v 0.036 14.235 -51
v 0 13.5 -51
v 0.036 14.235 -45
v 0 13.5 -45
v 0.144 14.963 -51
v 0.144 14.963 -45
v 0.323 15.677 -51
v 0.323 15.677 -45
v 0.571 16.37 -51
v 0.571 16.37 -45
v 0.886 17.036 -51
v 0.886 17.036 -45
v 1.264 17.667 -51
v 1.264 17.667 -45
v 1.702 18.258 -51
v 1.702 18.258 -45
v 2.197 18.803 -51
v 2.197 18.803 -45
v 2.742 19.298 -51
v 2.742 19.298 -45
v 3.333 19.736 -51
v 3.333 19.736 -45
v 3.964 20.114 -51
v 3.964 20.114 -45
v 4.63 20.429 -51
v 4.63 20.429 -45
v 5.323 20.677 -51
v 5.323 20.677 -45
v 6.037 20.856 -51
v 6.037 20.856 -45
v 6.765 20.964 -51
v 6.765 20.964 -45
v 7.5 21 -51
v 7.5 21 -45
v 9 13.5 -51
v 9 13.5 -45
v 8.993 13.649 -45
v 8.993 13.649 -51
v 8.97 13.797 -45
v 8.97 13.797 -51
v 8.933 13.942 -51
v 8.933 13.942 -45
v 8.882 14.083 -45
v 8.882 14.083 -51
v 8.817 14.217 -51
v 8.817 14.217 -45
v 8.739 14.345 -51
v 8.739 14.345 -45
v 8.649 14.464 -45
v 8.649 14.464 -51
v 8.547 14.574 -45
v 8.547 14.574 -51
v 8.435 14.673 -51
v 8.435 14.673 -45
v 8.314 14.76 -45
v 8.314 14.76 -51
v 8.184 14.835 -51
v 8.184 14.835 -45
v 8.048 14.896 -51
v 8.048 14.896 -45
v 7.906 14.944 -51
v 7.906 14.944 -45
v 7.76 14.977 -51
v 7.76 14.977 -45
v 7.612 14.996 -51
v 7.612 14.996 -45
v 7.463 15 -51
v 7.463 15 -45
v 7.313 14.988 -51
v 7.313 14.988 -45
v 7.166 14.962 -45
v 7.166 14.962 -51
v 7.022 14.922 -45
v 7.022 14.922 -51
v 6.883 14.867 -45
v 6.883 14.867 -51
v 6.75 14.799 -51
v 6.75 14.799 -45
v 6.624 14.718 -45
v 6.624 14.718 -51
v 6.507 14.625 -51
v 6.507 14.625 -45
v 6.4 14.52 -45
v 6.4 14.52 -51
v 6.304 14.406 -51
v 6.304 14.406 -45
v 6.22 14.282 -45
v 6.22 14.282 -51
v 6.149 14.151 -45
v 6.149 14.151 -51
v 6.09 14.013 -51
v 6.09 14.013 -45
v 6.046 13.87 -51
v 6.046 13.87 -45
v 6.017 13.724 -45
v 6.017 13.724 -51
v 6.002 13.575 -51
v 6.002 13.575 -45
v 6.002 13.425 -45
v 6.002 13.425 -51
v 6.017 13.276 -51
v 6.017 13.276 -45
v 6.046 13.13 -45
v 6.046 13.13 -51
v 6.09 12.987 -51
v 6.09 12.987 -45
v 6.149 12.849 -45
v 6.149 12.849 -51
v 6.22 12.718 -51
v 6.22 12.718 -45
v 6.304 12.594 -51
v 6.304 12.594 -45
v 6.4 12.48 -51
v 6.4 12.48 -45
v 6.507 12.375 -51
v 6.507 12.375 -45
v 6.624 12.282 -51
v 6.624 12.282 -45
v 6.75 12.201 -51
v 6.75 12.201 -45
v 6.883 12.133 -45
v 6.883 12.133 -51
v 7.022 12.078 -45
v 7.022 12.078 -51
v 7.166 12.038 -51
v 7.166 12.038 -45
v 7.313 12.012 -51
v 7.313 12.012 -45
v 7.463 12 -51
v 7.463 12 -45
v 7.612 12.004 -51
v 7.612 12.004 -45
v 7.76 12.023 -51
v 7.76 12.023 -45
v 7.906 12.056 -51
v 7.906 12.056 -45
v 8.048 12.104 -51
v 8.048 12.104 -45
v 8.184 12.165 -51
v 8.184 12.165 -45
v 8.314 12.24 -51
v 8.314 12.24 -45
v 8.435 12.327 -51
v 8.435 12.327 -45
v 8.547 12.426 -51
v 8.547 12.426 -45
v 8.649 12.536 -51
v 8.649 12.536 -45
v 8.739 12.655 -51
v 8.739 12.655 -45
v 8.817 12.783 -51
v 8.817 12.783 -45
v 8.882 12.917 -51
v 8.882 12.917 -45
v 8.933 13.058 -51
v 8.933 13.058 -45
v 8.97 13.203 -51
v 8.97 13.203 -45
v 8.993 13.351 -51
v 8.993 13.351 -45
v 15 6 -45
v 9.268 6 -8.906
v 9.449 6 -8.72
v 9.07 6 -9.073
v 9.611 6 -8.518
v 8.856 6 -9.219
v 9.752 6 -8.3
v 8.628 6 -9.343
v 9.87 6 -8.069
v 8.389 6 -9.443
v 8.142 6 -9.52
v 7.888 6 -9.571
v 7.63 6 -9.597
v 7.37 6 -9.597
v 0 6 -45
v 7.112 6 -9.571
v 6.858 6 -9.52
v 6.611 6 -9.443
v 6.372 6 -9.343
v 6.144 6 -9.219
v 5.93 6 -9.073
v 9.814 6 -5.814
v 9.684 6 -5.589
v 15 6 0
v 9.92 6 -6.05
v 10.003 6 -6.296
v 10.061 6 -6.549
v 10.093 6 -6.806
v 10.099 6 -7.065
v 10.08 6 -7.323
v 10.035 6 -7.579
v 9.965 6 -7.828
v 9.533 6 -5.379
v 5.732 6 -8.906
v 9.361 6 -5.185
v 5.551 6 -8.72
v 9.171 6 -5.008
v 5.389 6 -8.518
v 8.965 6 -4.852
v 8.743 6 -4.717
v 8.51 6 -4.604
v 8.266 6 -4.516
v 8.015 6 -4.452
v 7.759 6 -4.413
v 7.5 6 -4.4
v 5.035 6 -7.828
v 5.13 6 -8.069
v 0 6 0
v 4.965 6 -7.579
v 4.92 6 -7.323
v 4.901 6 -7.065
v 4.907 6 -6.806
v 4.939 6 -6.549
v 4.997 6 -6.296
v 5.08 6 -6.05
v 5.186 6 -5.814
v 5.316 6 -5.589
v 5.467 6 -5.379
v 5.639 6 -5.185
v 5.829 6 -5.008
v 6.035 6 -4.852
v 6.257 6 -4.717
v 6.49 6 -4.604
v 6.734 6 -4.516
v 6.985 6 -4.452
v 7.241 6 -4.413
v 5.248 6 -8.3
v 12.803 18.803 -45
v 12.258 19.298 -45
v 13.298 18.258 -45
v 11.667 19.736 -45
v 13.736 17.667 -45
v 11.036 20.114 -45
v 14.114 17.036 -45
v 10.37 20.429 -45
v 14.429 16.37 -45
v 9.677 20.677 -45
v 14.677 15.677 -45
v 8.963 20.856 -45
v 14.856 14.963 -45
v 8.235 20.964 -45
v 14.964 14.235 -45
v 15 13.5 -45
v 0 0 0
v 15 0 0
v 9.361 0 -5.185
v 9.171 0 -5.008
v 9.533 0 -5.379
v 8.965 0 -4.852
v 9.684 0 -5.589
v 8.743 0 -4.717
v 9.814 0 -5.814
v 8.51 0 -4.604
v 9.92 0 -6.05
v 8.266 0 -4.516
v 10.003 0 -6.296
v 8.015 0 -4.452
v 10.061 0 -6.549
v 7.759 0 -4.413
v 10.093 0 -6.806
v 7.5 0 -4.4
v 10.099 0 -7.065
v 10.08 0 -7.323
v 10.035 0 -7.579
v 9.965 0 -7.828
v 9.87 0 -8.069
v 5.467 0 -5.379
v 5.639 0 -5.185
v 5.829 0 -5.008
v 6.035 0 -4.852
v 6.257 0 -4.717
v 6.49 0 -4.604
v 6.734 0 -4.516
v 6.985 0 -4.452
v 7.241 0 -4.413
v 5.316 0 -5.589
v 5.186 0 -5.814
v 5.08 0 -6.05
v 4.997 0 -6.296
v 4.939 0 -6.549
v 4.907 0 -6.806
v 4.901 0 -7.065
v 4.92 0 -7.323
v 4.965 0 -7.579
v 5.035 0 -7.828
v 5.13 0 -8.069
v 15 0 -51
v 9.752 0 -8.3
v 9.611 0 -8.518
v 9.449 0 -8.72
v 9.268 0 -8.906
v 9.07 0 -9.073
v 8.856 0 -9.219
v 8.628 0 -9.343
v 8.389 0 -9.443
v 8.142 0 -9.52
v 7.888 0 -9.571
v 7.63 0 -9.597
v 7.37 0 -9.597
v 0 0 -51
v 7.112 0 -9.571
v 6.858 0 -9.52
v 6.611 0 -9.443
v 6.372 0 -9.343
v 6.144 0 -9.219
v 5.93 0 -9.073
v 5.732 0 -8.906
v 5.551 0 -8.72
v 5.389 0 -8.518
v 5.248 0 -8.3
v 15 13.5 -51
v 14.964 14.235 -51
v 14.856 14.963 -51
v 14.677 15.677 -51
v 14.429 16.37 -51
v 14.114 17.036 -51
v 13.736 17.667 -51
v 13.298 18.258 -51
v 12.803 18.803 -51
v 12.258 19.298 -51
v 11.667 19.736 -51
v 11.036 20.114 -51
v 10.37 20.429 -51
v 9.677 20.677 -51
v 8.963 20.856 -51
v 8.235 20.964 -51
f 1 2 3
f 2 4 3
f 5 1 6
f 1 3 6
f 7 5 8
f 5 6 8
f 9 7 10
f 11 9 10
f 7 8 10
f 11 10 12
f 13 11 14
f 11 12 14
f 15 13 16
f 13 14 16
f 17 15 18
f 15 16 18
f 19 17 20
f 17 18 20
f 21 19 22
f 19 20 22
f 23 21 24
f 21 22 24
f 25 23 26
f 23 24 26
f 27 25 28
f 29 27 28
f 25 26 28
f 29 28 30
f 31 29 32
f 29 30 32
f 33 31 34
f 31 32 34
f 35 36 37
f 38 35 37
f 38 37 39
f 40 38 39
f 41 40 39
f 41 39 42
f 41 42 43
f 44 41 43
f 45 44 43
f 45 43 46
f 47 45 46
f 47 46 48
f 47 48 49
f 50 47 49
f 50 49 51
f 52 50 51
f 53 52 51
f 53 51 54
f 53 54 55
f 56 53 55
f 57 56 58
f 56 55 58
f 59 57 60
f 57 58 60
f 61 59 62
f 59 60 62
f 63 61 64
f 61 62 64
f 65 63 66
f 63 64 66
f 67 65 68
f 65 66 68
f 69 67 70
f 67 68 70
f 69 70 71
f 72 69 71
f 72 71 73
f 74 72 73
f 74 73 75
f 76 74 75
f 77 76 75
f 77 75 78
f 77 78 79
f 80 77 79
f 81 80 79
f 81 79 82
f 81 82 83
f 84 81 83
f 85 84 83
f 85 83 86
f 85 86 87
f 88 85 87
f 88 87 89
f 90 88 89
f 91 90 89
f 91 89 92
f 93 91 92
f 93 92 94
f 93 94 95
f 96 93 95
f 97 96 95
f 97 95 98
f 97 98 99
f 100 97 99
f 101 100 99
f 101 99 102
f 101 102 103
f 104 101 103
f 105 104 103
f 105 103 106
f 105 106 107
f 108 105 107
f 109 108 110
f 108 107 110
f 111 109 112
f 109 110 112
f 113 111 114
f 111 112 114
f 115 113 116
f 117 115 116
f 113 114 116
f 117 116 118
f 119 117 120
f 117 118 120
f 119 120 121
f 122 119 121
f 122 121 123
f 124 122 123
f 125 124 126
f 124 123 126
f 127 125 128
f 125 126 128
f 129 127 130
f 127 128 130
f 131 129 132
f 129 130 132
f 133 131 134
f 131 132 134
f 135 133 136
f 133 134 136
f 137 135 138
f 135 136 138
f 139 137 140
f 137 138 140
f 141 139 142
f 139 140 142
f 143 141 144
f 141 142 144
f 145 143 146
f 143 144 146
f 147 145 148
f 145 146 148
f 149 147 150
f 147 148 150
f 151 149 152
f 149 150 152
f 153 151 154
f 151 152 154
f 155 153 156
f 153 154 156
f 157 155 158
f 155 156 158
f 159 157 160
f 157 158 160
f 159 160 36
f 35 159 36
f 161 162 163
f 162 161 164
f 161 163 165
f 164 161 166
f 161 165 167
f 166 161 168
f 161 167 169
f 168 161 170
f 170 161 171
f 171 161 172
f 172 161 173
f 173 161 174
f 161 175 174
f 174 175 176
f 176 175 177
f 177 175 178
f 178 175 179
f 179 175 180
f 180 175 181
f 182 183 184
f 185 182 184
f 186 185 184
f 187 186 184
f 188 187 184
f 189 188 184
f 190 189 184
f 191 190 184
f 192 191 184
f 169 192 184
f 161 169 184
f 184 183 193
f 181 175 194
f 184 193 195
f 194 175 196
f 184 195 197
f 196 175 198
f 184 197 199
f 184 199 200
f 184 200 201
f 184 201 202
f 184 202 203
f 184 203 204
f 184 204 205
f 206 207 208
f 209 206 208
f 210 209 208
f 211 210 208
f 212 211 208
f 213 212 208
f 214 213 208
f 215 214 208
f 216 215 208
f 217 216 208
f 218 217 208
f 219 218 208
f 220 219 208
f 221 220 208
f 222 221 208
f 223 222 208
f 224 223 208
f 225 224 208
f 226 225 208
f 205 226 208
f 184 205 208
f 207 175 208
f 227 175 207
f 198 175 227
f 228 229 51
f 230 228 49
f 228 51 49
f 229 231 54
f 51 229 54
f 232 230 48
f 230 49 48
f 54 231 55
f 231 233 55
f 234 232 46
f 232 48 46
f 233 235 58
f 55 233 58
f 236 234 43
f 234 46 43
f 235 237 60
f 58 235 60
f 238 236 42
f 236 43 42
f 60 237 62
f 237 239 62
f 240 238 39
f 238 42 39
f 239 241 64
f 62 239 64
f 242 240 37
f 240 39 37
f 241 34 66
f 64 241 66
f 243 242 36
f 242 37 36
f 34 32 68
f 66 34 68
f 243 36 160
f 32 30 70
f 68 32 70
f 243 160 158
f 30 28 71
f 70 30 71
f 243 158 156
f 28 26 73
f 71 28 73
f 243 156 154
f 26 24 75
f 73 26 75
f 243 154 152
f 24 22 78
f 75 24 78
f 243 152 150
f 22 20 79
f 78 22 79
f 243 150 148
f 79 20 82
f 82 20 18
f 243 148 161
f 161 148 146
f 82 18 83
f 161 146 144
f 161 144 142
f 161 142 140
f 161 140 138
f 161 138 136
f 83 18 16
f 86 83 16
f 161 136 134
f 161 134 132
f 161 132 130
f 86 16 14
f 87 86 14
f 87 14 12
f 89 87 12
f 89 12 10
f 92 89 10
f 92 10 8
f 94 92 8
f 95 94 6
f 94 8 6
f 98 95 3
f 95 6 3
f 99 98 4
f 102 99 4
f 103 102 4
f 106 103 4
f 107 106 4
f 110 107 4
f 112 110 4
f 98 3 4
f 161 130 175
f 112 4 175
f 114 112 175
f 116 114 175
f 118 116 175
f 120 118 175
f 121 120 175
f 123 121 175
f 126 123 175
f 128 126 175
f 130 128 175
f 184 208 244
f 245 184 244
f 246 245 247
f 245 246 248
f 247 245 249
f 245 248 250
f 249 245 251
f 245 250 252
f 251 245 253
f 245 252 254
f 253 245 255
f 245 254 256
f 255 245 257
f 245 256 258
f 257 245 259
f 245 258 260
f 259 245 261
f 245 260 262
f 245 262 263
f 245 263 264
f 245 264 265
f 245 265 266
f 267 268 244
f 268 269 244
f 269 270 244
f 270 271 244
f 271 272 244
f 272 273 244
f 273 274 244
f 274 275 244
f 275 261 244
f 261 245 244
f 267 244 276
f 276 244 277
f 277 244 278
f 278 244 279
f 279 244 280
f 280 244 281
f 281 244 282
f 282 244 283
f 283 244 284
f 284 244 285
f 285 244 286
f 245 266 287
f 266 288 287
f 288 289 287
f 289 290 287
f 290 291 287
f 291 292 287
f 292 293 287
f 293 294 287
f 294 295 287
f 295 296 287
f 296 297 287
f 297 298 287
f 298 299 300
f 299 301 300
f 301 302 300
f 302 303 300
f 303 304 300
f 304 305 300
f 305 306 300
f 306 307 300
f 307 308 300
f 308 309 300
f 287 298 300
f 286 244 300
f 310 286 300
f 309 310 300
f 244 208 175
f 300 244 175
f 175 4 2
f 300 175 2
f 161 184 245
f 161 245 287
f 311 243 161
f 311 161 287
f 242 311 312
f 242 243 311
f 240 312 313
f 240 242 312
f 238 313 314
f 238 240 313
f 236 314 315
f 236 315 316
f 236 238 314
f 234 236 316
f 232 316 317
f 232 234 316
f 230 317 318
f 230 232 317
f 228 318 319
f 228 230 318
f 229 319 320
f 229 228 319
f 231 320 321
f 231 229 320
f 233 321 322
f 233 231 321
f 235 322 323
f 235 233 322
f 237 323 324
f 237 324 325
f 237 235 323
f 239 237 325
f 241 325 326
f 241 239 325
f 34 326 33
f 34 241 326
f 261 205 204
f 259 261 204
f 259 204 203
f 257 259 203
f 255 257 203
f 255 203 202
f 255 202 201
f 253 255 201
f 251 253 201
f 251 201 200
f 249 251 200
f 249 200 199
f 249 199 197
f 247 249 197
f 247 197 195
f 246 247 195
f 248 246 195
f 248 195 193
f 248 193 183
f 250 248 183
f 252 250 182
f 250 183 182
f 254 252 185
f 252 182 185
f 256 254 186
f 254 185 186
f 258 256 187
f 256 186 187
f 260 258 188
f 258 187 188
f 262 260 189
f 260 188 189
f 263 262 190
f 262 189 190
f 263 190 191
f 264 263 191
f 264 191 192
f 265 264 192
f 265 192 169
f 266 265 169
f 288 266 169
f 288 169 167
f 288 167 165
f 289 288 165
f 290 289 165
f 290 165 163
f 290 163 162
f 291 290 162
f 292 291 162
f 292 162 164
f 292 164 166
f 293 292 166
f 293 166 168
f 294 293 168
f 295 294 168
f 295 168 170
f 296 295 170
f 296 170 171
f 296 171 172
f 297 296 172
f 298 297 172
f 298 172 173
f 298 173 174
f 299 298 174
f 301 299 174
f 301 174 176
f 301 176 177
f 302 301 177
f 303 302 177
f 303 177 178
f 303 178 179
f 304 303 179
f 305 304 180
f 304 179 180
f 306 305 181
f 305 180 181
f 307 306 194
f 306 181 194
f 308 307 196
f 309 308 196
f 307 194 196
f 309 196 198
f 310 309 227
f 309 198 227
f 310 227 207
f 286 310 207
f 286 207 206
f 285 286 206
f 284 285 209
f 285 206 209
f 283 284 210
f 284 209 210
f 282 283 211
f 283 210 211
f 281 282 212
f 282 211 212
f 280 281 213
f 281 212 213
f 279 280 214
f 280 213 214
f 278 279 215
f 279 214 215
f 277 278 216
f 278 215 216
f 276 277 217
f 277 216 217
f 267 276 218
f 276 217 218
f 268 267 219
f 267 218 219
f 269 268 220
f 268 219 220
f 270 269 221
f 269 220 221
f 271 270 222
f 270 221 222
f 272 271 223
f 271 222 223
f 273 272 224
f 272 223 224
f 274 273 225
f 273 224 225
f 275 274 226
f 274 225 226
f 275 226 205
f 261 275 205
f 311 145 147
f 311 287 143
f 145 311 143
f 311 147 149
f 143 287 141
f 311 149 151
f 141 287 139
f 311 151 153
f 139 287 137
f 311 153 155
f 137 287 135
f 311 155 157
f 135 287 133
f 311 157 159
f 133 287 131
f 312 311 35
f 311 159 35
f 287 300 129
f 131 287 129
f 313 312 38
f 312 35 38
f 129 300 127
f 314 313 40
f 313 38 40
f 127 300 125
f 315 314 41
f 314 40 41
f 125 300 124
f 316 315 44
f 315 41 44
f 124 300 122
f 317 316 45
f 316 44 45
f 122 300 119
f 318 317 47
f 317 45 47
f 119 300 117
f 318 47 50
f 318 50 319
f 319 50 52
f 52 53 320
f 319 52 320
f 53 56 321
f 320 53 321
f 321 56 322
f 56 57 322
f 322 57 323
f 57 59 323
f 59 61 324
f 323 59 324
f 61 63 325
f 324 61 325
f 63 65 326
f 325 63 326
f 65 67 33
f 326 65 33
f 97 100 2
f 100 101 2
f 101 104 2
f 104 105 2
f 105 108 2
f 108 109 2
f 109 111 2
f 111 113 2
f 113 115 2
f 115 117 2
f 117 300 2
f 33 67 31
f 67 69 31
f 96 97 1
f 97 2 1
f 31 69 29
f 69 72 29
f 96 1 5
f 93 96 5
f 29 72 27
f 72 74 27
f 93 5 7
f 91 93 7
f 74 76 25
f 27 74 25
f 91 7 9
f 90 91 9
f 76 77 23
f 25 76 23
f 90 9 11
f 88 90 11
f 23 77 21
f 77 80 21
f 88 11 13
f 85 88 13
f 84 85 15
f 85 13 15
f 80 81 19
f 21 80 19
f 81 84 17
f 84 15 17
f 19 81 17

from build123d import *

# Parameters (mm, degrees)
BOSS_EXTRUDE1_DEPTH = 15
SKETCH2_R           = 2.6
CUT_EXTRUDE1_DEPTH  = 56.235857919
SKETCH3_R           = 1.5
CUT_EXTRUDE2_DEPTH  = 52.874849397
FILLET1_R           = 7.5


with BuildPart() as part:
    # Sketch1 → Boss-Extrude1 (new body)
    with BuildSketch(Plane(origin=(0, 0, 0), x_dir=(0, 0, -1), z_dir=(1, 0, 0))):
        Polygon((0, 0), (51, 0), (51, 3.916666667), (51, 21), (45, 21), (45, 6), (0, 6), align=None)
    extrude(amount=BOSS_EXTRUDE1_DEPTH)

    # Sketch2 → Cut-Extrude1 (cut, through all)
    with BuildSketch(Plane(origin=(0, 6, 0), x_dir=(1, 0, 0), z_dir=(0, 1, 0))):
        with Locations(Location((7.5, 7, 0), (0, 0, 270))):
            Circle(SKETCH2_R)
    extrude(amount=-CUT_EXTRUDE1_DEPTH, mode=Mode.SUBTRACT)

    # Sketch3 → Cut-Extrude2 (cut, through all)
    with BuildSketch(Plane.XY.offset(-45)):
        with Locations((7.5, 13.5)):
            Circle(SKETCH3_R)
    extrude(amount=-CUT_EXTRUDE2_DEPTH, mode=Mode.SUBTRACT)

    # Fillet1
    fillet1_edges = [part.edges().sort_by_distance(p)[0] for p in [
        (0, 21, -48),
        (15, 21, -48),
    ]]
    fillet(fillet1_edges, radius=FILLET1_R - 0.0001)  # a hair under: the kernel refuses the full size


solid = part.part
